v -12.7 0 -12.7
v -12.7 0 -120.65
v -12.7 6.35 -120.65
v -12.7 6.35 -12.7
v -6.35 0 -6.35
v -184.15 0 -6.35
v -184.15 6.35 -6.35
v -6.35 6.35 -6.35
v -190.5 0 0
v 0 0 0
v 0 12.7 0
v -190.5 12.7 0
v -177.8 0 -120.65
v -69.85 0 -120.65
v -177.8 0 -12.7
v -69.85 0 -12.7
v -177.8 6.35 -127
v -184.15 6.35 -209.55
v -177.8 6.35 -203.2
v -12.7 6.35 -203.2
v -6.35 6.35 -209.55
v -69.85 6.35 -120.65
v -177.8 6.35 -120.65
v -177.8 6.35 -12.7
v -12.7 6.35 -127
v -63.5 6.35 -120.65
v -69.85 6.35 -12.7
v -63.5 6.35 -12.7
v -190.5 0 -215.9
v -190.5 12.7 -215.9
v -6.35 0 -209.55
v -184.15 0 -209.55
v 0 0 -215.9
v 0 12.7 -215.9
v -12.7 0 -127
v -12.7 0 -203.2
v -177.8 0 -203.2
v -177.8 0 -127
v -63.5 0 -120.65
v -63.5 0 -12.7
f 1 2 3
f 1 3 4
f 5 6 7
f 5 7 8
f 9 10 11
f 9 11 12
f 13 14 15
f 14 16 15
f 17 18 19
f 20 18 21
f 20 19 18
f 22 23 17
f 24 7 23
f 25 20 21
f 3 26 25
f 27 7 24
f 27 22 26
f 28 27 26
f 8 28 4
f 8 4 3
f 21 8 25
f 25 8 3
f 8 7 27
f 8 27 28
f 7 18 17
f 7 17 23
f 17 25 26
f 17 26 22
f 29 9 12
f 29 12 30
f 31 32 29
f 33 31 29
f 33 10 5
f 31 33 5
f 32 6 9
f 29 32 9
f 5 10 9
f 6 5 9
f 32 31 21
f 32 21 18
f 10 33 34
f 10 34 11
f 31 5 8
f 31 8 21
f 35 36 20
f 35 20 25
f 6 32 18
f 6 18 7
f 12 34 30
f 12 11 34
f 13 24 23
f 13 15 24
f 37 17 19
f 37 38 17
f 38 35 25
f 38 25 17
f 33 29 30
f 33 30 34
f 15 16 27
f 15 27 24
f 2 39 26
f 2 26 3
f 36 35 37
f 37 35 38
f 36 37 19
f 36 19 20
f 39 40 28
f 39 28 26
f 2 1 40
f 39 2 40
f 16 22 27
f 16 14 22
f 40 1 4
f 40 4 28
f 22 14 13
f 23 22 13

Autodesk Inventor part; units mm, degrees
ref_plane "YZ Plane" through (0, 0, 0) normal (1, 0, 0) x (0, 1, 0)
ref_plane "XZ Plane" through (0, 0, 0) normal (0, 1, 0) x (-1, 0, 0)
ref_plane "XY Plane" through (0, 0, 0) normal (0, 0, 1) x (1, 0, 0)
sketch "Sketch1" plane through (0, 0, 0) normal (0, 1, 0) x (-1, 0, 0)
  line L0 (0, 0) -> (190.5, 0)
  line L1 (190.5, 0) -> (190.5, -215.9)
  line L2 (190.5, -215.9) -> (0, -215.9)
  line L3 (0, -215.9) -> (0, 0)
  dimension "d0" = 215.9
  dimension "d1" = 190.5
extrude "Extrusion1" add sketch "Sketch1" along normal blind 12.7
sketch "Sketch2" plane through (0, 0, 0) normal (0, -1, 0) x (1, 0, 0)
  line L0 (-190.5, 0) -> (0, 0) construction
  line L1 (0, -215.9) -> (-190.5, -215.9) construction
  line L2 (0, 0) -> (-190.5, 0)
  line L3 (-190.5, 0) -> (-190.5, -215.9) construction
  line L4 (-190.5, -215.9) -> (0, -215.9)
  line L5 (0, -215.9) -> (0, 0) construction
  line L6 (-184.15, -209.55) -> (-184.15, -6.35)
  line L7 (-184.15, -6.35) -> (-6.35, -6.35)
  line L8 (-6.35, -6.35) -> (-6.35, -209.55)
  line L9 (-6.35, -209.55) -> (-184.15, -209.55)
  line L10 (-177.8, -203.2) -> (-12.7, -203.2)
  line L11 (-12.7, -12.7) -> (-63.5, -12.7)
  line L12 (-63.5, -12.7) -> (-63.5, -120.65)
  line L13 (-63.5, -120.65) -> (-12.7, -120.65)
  line L14 (-12.7, -120.65) -> (-12.7, -12.7)
  line L15 (-69.85, -120.65) -> (-69.85, -12.7)
  line L16 (-127, -6.35) -> (-6.35, -6.35)
  line L17 (-6.35, -6.35) -> (-6.35, -127)
  line L18 (-12.7, -127) -> (-127, -127)
  line L19 (-127, -127) -> (-177.8, -127)
  line L20 (-69.85, -120.65) -> (-177.8, -120.65)
  line L21 (-12.7, -12.7) -> (-63.5, -12.7)
  line L22 (-69.85, -12.7) -> (-177.8, -12.7)
  line L23 (-12.7, -203.2) -> (-12.7, -127)
  line L24 (-12.7, -120.65) -> (-12.7, -12.7)
  line L25 (-177.8, -12.7) -> (-177.8, -120.65)
  line L26 (-177.8, -127) -> (-177.8, -203.2)
  dimension "d4" = 6.35
  dimension "d8" = 6.35
  dimension "d11" = 107.95
  dimension "d12" = 107.95
extrude "Extrusion2" cut sketch "Sketch2" against normal blind 6.35
properties part number "RSX Top" material "Aluminum 6061"
